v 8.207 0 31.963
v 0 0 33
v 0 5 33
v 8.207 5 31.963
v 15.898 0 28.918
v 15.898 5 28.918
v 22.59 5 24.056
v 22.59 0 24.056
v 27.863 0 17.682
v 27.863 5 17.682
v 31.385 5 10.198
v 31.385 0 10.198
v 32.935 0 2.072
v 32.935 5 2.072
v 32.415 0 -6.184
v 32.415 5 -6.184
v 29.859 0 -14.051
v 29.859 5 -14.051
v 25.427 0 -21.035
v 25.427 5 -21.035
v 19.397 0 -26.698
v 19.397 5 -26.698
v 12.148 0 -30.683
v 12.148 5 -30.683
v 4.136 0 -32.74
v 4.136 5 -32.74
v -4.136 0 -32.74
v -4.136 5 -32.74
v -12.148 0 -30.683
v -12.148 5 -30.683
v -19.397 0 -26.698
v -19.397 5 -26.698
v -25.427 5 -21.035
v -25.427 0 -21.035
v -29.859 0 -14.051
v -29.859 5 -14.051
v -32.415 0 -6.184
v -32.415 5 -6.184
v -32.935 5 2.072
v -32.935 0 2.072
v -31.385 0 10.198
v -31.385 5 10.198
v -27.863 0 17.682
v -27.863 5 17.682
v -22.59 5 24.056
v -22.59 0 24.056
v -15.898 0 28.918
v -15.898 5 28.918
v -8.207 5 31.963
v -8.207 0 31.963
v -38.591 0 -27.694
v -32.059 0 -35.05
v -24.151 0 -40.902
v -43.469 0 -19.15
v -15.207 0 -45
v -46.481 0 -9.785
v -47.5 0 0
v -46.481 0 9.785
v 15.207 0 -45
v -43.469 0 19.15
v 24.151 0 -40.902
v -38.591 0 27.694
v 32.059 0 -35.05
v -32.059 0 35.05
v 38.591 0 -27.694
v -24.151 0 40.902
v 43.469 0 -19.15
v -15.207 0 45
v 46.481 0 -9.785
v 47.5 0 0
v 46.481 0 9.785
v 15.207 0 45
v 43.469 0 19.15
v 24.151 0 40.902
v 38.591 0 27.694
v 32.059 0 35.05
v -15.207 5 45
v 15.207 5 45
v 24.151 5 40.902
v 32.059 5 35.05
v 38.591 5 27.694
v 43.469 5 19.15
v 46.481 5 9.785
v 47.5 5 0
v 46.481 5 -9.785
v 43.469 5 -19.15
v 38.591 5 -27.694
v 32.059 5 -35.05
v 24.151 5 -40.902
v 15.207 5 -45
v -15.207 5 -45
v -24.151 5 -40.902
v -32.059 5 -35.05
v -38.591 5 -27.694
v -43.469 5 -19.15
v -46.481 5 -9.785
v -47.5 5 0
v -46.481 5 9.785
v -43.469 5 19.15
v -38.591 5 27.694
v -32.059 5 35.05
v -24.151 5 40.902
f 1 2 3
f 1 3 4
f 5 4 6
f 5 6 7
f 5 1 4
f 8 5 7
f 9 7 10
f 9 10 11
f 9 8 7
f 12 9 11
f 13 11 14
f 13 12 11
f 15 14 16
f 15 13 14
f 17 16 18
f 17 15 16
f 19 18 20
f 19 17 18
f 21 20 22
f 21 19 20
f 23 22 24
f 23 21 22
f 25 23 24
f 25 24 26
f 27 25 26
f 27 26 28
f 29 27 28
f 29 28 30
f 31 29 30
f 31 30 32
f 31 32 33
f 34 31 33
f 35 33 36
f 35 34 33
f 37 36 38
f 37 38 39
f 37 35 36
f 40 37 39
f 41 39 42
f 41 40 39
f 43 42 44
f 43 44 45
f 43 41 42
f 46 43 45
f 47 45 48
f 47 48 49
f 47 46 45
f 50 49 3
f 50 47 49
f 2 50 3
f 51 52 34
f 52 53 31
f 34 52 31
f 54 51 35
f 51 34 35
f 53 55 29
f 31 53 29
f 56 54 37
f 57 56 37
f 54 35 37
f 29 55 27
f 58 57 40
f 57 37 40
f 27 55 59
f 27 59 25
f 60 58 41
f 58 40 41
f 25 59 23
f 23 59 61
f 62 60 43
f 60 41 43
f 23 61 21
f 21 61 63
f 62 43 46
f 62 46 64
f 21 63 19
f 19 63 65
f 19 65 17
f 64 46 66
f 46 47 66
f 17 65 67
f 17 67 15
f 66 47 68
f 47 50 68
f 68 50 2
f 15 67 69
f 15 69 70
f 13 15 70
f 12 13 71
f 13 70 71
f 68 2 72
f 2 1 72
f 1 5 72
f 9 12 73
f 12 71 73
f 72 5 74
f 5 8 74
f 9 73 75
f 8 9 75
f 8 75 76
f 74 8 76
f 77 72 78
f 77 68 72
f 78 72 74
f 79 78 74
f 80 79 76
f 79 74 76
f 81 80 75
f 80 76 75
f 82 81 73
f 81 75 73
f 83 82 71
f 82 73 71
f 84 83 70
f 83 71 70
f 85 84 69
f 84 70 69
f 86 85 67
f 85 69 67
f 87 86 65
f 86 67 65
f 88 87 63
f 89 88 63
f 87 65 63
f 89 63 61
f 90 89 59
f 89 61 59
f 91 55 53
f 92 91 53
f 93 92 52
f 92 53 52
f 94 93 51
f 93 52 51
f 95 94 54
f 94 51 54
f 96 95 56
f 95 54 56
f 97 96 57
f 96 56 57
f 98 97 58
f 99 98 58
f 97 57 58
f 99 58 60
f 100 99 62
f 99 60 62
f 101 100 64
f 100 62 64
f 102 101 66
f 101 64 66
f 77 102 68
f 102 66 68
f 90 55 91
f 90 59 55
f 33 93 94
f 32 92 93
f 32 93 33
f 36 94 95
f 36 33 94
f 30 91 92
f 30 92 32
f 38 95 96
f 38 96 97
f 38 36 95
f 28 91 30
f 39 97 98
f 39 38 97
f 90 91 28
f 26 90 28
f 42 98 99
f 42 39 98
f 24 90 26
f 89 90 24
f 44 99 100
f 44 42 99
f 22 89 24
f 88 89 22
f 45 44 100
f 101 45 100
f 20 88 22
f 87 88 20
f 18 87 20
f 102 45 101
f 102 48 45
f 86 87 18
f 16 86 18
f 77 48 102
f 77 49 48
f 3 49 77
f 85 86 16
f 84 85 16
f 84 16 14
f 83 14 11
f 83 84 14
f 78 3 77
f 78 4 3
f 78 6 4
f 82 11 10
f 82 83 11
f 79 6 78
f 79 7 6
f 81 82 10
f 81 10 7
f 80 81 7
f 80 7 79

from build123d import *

# Parameters (mm, degrees)
SKETCH_1_R          = 47.5
SKETCH_1_R_2        = 33
EXTRUDE_1_DEPTH     = 5
SKETCH_2_W          = 10
SKETCH_2_H          = 30
CUT_EXTRUDE_1_DEPTH = 25


with BuildPart() as part:
    # Эскиз1 → Бобышка-Вытянуть1 (new body)
    with BuildSketch(Plane(origin=(0, 0, 0), x_dir=(1, 0, 0), z_dir=(0, 1, 0))):
        with Locations(Location((0, 0, 0), (0, 0, 270))):
            Circle(SKETCH_1_R)
        with Locations(Location((0, 0, 0), (0, 0, 270))):
            Circle(SKETCH_1_R_2, mode=Mode.SUBTRACT)
    extrude(amount=EXTRUDE_1_DEPTH)

    # Эскиз2 → Вырез-Вытянуть1 (cut, symmetric)
    with BuildSketch(Plane(origin=(0, 0, 0), x_dir=(0, 0, -1), z_dir=(1, 0, 0))):
        with Locations((-50, 0)):
            Rectangle(SKETCH_2_W, SKETCH_2_H)
        with Locations((50, 0)):
            Rectangle(SKETCH_2_W, SKETCH_2_H)
    extrude(amount=CUT_EXTRUDE_1_DEPTH, both=True, mode=Mode.SUBTRACT)


solid = part.part
